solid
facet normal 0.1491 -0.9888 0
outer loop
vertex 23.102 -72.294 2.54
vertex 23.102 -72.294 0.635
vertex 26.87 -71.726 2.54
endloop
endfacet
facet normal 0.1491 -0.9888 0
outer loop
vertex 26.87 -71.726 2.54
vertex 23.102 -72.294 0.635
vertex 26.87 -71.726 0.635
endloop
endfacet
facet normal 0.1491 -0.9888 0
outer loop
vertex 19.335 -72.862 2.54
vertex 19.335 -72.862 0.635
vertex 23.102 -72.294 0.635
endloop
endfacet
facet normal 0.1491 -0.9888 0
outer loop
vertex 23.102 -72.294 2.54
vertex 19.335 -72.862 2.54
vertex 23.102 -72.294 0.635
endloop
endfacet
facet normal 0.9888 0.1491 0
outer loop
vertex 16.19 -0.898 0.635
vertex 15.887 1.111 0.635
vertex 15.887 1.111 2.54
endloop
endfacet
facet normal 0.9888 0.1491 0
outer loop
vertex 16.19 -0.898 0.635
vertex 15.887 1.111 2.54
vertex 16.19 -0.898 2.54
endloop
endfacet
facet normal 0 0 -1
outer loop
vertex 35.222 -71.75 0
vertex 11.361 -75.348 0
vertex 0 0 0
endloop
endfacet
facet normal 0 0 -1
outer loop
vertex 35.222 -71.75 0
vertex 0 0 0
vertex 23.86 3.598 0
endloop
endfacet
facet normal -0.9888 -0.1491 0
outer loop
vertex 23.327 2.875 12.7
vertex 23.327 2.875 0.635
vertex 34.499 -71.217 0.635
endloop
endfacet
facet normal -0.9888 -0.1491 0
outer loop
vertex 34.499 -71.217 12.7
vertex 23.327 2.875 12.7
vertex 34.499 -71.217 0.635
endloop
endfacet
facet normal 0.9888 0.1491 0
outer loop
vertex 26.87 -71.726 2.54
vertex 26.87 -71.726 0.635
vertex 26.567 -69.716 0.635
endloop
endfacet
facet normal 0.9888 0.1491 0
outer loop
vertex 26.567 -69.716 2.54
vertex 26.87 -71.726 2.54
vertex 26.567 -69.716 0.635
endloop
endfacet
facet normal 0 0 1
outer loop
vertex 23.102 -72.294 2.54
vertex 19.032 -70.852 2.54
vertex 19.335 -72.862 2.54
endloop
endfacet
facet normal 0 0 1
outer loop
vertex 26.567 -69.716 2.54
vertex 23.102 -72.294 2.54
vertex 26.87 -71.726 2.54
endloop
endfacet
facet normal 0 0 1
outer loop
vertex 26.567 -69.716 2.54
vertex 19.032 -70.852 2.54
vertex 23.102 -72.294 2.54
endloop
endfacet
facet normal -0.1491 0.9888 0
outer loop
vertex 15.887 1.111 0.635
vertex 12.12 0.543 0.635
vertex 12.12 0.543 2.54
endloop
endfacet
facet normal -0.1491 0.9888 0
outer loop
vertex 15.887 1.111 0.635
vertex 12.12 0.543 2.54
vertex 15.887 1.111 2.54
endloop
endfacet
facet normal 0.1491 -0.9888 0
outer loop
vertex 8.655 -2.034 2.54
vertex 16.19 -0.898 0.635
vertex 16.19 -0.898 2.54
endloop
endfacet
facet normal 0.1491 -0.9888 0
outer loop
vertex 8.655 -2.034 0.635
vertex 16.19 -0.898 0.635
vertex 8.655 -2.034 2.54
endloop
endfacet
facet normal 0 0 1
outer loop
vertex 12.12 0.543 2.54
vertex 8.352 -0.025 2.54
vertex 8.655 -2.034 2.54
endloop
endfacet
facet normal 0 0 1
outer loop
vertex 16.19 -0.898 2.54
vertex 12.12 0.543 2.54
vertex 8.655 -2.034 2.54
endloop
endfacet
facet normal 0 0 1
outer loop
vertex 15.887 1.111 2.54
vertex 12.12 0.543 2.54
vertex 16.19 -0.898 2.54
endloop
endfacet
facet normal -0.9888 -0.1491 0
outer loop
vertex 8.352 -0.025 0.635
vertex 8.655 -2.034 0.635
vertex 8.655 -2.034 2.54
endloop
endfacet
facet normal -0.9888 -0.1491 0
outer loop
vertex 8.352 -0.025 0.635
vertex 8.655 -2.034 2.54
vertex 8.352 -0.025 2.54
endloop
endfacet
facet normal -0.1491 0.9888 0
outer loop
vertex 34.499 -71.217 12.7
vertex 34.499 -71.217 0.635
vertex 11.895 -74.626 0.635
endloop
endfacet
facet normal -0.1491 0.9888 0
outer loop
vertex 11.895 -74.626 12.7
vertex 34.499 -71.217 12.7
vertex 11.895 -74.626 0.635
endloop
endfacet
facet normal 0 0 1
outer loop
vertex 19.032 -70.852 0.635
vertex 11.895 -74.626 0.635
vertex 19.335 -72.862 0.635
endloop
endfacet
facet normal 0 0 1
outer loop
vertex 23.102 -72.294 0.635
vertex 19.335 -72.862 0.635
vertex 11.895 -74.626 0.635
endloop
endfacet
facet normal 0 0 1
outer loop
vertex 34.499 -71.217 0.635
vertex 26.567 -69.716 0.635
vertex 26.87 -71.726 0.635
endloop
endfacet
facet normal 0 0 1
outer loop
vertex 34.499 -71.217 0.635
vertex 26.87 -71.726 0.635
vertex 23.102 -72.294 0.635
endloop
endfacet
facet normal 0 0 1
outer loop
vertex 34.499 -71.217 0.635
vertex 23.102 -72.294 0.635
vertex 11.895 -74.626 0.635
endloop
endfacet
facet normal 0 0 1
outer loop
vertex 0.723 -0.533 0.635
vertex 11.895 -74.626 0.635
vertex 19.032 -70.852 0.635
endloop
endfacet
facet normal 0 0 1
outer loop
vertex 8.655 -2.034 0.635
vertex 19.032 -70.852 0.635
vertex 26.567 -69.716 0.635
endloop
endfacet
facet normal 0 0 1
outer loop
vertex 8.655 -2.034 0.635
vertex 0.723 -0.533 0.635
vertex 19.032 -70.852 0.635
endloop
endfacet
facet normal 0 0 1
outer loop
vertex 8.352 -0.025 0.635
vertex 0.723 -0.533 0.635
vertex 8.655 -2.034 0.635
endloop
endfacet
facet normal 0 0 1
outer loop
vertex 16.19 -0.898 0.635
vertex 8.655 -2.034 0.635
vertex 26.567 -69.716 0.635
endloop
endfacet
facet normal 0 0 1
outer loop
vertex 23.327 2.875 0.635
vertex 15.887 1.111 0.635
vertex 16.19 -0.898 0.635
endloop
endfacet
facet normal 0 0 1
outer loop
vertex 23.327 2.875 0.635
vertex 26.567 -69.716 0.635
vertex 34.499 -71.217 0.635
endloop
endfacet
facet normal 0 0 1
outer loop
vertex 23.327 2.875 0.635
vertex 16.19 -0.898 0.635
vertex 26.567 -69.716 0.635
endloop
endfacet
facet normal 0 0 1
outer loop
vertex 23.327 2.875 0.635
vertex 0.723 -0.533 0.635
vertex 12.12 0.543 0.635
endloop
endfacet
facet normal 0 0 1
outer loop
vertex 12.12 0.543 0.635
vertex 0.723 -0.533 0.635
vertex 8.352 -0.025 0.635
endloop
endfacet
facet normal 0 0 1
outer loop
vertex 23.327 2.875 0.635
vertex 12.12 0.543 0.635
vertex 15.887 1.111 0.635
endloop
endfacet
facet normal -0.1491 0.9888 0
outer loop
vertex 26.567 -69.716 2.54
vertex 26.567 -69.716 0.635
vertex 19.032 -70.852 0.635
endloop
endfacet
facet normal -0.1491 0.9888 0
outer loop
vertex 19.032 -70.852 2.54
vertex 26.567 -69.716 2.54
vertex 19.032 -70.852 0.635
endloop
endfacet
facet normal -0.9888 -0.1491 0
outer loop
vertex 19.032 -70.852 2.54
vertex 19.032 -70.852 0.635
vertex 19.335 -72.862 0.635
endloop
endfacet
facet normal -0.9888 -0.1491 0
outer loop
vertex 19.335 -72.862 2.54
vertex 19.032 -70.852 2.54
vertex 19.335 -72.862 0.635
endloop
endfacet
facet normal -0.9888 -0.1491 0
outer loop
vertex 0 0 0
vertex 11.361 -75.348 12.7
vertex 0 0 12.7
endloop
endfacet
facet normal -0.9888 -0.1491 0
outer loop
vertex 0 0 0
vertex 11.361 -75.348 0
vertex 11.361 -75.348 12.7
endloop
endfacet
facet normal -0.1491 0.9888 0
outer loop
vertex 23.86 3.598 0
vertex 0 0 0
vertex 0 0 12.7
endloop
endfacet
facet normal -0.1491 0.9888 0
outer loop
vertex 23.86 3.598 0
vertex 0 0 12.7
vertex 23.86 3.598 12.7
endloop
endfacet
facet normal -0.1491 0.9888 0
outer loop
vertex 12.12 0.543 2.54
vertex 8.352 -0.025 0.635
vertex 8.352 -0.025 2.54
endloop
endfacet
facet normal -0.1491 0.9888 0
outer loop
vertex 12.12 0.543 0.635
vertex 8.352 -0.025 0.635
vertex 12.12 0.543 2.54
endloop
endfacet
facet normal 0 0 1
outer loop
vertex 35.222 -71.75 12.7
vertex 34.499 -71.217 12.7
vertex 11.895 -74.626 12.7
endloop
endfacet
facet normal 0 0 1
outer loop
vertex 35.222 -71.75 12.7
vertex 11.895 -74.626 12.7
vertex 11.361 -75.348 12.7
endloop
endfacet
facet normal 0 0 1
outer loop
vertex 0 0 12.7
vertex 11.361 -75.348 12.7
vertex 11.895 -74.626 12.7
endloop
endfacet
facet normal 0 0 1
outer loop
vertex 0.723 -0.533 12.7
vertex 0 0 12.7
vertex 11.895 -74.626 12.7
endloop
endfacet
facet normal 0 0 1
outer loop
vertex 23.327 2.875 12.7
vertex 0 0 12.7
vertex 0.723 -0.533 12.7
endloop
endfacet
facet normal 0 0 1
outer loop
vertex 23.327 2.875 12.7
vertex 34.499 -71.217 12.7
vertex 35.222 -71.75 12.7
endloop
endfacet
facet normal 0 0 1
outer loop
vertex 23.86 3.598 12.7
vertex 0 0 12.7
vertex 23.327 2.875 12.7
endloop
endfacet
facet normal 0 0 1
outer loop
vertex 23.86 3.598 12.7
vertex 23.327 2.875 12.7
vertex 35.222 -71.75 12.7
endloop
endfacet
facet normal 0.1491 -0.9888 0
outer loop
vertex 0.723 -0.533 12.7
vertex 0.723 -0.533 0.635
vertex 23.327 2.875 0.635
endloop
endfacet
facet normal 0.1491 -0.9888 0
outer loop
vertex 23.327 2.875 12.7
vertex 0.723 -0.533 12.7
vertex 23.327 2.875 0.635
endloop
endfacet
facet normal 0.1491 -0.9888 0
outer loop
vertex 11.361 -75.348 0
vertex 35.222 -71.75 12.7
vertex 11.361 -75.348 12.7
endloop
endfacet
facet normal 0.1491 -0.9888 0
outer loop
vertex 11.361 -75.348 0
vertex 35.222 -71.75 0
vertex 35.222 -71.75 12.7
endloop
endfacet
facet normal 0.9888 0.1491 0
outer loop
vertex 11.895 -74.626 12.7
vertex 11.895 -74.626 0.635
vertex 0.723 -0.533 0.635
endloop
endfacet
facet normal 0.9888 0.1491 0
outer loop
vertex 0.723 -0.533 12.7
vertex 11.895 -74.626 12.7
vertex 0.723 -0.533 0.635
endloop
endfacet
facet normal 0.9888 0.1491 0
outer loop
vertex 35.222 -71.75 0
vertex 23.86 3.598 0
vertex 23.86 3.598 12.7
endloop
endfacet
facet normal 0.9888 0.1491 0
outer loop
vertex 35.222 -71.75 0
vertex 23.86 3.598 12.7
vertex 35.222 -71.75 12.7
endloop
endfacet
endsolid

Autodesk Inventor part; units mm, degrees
ref_plane "YZ Plane" through (0, 0, 0) normal (1, 0, 0) x (0, 1, 0)
ref_plane "XZ Plane" through (0, 0, 0) normal (0, 1, 0) x (-1, 0, 0)
ref_plane "XY Plane" through (0, 0, 0) normal (0, 0, 1) x (1, 0, 0)
sketch "Sketch1" plane through (0, 0, 0) normal (0, 0, 1) x (1, 0, 0)
  line L0 (0, 0) -> (23.8603, 3.5978)
  line L1 (23.8603, 3.5978) -> (35.2216, -71.7505)
  line L2 (35.2216, -71.7505) -> (11.3613, -75.3483)
  line L3 (11.3613, -75.3483) -> (0, 0)
  line L4 (12.1195, 0.5431) -> (15.8869, 1.1111)
  line L5 (15.8869, 1.1111) -> (16.1899, -0.8981)
  line L6 (16.1899, -0.8981) -> (8.6551, -2.0343)
  line L7 (8.6551, -2.0343) -> (8.3521, -0.025)
  line L8 (8.3521, -0.025) -> (12.1195, 0.5431)
  line L9 (23.1021, -72.2936) -> (26.8695, -71.7255)
  line L10 (26.8695, -71.7255) -> (26.5666, -69.7162)
  line L11 (26.5666, -69.7162) -> (19.0317, -70.8524)
  line L12 (19.0317, -70.8524) -> (19.3347, -72.8616)
  line L13 (19.3347, -72.8616) -> (23.1021, -72.2936)
  dimension "d0" = 24.13
  dimension "d1" = 76.2
  dimension "d9" = 2.032
  dimension "d10" = 7.62
extrude "Extrusion1" add sketch "Sketch1" along normal blind 12.7 contours L0 L1 L2 L3 | L4 L5 L6 L7 L8 | L13 L12 L11 L10 L9
shell "Shell1" thickness 0.635 removed faces 1 at (23.4811, -47.8337, 12.7)
sketch "Sketch2" plane through (11.8946, -74.6257, 0.635) normal (0, 0, 1) x (0.9888, 0.1491, 0)
  point P0 (-0.635, 75.565)
extrude "Extrusion2" add sketch "Sketch1" along normal blind 2.54 contours L4 L5 L6 L7 L8 | L13 L12 L11 L10 L9
properties part number "batteryHousing"
